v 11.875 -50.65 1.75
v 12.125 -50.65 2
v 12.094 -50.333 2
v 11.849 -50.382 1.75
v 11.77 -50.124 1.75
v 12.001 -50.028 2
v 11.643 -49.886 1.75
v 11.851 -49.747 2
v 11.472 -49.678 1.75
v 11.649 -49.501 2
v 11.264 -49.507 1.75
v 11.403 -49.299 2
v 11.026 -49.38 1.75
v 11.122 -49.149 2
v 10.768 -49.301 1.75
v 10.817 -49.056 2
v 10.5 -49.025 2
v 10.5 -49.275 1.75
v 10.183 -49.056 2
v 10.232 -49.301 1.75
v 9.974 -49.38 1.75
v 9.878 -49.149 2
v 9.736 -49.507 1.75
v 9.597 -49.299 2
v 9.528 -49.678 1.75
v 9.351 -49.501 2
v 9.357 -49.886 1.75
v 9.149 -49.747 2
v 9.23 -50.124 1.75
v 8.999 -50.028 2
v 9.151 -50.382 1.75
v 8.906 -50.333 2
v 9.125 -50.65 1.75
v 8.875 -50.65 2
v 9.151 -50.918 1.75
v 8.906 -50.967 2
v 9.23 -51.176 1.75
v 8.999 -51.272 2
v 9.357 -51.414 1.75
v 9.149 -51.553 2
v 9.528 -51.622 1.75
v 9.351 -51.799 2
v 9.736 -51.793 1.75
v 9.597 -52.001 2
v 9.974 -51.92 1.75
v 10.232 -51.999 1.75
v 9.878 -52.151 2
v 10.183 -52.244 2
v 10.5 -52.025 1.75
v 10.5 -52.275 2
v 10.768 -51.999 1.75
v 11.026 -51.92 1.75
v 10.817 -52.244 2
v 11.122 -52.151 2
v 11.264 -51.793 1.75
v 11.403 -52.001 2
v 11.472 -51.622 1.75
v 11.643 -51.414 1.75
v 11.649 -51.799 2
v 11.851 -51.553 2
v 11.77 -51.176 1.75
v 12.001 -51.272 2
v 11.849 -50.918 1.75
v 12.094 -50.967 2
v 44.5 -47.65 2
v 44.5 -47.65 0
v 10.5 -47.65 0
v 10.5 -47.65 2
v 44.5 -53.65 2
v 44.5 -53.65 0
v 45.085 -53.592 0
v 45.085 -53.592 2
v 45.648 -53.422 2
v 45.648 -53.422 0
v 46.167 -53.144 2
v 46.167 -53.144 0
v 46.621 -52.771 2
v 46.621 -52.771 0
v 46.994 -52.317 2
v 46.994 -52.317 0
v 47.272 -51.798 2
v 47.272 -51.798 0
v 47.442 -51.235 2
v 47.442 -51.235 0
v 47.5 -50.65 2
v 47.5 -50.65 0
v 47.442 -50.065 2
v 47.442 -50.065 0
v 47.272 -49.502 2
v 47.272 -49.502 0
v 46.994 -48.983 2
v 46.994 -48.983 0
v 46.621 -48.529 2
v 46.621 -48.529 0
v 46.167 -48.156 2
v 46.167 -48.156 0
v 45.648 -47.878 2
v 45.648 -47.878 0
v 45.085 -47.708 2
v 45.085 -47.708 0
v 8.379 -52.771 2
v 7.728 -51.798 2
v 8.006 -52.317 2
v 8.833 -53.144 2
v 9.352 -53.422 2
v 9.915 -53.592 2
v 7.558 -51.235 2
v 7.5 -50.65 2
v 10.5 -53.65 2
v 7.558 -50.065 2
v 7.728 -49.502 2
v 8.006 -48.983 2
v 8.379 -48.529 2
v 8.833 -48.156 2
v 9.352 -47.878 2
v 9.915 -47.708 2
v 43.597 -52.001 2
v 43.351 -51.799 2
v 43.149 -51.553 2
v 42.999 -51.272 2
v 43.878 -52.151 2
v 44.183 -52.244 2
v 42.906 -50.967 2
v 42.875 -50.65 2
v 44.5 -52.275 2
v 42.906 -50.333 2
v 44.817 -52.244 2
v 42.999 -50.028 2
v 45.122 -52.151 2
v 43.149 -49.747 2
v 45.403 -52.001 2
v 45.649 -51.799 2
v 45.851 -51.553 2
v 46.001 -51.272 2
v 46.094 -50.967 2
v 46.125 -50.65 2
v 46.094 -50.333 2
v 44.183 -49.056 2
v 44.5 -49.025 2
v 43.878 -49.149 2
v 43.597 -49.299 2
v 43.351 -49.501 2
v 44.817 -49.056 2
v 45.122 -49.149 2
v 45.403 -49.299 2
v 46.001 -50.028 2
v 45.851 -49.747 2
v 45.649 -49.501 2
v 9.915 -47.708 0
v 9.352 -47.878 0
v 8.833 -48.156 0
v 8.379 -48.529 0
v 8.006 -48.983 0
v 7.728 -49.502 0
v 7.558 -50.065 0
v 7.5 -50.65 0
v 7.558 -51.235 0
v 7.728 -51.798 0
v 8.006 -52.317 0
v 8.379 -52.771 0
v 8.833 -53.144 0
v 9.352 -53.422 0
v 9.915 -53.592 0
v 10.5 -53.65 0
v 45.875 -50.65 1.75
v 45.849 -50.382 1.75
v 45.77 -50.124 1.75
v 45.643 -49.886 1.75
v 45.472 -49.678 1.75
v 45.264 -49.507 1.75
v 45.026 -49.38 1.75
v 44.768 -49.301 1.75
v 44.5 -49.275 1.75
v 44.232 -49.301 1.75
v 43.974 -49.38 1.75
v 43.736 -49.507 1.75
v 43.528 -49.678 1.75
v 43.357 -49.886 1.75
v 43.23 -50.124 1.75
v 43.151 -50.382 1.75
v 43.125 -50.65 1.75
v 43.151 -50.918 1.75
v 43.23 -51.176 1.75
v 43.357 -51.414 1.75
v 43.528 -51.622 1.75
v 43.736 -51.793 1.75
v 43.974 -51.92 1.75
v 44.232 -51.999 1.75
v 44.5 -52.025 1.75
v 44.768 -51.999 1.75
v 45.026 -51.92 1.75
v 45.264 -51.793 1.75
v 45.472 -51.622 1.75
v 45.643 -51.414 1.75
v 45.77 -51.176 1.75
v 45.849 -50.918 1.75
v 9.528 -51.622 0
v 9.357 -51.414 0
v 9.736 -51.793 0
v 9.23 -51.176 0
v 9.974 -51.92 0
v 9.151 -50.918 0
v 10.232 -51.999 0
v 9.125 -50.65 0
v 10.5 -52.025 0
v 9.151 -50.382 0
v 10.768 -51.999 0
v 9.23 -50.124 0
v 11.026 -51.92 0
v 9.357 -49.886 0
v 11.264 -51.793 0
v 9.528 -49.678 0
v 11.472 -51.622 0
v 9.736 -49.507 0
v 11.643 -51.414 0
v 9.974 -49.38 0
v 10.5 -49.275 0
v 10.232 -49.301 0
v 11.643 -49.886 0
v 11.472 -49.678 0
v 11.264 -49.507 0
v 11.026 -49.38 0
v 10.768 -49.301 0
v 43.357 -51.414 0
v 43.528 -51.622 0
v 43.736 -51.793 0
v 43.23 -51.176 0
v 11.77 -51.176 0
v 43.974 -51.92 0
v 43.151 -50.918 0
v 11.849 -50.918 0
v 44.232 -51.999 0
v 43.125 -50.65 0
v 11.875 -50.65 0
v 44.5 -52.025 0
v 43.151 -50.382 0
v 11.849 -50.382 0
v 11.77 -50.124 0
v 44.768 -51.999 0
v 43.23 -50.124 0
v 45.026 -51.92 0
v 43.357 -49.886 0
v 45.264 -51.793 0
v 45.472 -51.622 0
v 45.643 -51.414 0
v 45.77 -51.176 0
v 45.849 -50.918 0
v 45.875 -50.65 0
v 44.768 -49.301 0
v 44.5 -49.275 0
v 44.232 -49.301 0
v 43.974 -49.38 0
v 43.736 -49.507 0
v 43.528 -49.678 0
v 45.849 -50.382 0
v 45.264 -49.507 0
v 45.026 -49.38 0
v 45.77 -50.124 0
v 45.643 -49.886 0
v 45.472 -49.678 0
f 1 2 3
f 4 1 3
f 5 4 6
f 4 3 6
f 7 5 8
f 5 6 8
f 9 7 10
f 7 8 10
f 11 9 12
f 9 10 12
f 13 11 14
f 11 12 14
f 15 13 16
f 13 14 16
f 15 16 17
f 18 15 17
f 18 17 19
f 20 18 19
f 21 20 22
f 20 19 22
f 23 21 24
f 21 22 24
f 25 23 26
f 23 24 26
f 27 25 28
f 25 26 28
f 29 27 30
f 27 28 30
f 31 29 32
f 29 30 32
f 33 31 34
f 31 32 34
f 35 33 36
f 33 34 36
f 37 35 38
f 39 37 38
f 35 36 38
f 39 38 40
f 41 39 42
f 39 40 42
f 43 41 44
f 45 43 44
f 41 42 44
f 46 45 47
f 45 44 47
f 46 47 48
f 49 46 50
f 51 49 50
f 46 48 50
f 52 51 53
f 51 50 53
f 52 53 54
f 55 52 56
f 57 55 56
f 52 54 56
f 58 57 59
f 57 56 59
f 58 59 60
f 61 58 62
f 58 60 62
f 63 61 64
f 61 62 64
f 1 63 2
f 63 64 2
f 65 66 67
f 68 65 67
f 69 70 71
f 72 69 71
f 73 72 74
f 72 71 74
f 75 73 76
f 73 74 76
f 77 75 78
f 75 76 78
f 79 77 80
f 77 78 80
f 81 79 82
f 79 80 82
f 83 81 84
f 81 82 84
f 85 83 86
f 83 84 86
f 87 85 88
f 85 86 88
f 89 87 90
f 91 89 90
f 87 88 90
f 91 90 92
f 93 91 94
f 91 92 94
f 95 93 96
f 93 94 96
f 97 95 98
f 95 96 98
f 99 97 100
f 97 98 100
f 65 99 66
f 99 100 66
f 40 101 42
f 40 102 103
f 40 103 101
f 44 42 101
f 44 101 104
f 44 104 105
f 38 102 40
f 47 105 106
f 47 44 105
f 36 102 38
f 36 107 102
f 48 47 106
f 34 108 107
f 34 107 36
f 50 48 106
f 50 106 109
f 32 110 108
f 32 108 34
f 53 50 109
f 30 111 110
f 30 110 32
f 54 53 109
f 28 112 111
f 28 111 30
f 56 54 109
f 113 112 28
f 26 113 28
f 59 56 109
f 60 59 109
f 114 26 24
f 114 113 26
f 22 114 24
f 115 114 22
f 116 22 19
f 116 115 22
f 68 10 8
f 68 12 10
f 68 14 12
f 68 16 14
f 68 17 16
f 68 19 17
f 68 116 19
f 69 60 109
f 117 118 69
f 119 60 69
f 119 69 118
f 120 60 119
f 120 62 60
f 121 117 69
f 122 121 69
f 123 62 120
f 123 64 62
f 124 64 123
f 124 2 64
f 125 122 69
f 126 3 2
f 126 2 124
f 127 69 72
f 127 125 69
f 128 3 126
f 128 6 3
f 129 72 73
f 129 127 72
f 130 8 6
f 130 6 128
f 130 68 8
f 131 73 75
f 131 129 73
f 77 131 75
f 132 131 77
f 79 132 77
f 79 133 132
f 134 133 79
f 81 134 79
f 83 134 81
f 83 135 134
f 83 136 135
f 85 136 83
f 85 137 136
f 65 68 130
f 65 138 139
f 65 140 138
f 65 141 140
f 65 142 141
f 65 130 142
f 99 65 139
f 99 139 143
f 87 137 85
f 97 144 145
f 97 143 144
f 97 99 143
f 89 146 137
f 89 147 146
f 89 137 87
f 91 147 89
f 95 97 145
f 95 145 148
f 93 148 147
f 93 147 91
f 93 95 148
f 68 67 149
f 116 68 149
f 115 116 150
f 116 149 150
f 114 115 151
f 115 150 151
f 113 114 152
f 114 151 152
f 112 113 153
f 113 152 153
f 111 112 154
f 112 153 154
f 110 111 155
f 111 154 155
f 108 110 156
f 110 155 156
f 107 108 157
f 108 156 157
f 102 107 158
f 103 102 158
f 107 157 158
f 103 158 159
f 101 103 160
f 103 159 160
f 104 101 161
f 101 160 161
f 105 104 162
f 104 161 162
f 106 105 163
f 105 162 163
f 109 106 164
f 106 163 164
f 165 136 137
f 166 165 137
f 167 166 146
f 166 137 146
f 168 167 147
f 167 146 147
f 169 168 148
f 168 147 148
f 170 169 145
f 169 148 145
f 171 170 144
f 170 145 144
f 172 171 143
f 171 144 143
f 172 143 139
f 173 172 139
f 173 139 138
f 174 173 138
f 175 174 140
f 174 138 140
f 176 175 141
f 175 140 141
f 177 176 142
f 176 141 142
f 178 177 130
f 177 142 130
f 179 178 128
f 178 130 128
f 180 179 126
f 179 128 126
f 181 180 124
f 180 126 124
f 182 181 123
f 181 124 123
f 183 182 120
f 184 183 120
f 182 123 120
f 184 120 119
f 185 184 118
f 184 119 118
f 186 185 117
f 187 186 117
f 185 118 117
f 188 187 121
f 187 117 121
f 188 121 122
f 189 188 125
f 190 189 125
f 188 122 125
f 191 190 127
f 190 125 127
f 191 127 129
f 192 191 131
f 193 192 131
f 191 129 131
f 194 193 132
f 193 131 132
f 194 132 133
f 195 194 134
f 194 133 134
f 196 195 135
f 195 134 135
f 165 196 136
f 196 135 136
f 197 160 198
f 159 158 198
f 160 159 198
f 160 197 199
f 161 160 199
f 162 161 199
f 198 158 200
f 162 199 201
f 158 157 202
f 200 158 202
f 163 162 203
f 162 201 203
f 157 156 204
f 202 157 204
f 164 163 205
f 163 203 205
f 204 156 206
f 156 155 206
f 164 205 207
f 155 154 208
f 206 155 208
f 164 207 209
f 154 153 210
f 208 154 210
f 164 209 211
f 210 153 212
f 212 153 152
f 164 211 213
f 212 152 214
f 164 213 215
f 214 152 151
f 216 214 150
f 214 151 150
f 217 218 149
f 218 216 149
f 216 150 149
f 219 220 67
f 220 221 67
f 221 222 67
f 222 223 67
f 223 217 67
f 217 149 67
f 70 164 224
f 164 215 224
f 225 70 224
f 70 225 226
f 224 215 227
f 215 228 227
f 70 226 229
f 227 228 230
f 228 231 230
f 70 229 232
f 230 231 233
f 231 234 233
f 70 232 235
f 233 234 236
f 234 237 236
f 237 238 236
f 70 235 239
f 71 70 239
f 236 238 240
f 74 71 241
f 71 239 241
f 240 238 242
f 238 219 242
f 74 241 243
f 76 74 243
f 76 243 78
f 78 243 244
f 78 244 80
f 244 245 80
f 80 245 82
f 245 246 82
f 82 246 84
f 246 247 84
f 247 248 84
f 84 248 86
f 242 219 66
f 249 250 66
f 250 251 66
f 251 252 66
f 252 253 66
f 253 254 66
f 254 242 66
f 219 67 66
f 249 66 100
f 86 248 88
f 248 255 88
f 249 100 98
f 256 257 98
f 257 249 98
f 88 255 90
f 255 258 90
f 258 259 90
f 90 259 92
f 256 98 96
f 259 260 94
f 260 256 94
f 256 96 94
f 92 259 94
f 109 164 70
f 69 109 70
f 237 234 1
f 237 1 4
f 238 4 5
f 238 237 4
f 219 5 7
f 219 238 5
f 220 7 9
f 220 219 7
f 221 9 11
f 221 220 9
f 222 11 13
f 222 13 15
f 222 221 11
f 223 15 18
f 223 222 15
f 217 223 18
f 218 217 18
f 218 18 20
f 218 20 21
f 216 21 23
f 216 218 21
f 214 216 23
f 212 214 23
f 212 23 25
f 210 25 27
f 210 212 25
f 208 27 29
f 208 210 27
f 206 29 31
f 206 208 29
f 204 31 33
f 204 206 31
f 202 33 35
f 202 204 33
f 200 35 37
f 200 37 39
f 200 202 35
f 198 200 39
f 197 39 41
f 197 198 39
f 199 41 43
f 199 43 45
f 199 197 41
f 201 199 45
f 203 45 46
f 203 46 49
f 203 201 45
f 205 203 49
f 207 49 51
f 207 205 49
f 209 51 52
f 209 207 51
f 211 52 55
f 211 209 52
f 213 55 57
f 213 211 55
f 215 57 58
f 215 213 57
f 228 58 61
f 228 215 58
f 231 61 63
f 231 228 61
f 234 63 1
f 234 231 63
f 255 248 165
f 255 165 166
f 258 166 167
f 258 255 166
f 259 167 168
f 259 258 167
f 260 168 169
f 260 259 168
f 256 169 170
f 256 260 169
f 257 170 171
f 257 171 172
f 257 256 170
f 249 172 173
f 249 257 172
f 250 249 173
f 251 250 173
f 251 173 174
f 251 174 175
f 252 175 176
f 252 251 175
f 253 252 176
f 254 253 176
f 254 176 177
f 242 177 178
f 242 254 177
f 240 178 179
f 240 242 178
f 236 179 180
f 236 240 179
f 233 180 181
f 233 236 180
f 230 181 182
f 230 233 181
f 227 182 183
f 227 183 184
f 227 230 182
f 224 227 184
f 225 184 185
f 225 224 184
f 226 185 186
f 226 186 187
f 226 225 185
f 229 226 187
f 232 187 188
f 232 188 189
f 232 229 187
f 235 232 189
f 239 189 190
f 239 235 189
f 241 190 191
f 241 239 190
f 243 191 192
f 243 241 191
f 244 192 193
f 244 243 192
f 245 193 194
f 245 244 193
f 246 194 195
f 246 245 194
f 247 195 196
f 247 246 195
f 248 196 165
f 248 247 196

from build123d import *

# Parameters (mm, degrees)
SKETCH1_R           = 1.375
BOSS_EXTRUDE1_DEPTH = 2
CHAMFER1_SIZE       = 0.25


with BuildPart() as part:
    # Sketch1 → Boss-Extrude1 (new body)
    with BuildSketch(Plane.XY):
        with BuildLine():
            Line((44.5, -47.65), (10.5, -47.65))
            ThreePointArc((10.5, -47.65), (7.5, -50.65), (10.5, -53.65))
            Line((10.5, -53.65), (44.5, -53.65))
            ThreePointArc((44.5, -53.65), (47.5, -50.65), (44.5, -47.65))
        make_face()
        with Locations((10.5, -50.65)):
            Circle(SKETCH1_R, mode=Mode.SUBTRACT)
        with Locations((44.5, -50.65)):
            Circle(SKETCH1_R, mode=Mode.SUBTRACT)
    extrude(amount=BOSS_EXTRUDE1_DEPTH)

    # Chamfer1
    chamfer1_edges = [part.edges().sort_by_distance(p)[0] for p in [
        (9.125, -50.65, 2),
        (43.125, -50.65, 2),
    ]]
    chamfer(chamfer1_edges, length=CHAMFER1_SIZE)


solid = part.part
